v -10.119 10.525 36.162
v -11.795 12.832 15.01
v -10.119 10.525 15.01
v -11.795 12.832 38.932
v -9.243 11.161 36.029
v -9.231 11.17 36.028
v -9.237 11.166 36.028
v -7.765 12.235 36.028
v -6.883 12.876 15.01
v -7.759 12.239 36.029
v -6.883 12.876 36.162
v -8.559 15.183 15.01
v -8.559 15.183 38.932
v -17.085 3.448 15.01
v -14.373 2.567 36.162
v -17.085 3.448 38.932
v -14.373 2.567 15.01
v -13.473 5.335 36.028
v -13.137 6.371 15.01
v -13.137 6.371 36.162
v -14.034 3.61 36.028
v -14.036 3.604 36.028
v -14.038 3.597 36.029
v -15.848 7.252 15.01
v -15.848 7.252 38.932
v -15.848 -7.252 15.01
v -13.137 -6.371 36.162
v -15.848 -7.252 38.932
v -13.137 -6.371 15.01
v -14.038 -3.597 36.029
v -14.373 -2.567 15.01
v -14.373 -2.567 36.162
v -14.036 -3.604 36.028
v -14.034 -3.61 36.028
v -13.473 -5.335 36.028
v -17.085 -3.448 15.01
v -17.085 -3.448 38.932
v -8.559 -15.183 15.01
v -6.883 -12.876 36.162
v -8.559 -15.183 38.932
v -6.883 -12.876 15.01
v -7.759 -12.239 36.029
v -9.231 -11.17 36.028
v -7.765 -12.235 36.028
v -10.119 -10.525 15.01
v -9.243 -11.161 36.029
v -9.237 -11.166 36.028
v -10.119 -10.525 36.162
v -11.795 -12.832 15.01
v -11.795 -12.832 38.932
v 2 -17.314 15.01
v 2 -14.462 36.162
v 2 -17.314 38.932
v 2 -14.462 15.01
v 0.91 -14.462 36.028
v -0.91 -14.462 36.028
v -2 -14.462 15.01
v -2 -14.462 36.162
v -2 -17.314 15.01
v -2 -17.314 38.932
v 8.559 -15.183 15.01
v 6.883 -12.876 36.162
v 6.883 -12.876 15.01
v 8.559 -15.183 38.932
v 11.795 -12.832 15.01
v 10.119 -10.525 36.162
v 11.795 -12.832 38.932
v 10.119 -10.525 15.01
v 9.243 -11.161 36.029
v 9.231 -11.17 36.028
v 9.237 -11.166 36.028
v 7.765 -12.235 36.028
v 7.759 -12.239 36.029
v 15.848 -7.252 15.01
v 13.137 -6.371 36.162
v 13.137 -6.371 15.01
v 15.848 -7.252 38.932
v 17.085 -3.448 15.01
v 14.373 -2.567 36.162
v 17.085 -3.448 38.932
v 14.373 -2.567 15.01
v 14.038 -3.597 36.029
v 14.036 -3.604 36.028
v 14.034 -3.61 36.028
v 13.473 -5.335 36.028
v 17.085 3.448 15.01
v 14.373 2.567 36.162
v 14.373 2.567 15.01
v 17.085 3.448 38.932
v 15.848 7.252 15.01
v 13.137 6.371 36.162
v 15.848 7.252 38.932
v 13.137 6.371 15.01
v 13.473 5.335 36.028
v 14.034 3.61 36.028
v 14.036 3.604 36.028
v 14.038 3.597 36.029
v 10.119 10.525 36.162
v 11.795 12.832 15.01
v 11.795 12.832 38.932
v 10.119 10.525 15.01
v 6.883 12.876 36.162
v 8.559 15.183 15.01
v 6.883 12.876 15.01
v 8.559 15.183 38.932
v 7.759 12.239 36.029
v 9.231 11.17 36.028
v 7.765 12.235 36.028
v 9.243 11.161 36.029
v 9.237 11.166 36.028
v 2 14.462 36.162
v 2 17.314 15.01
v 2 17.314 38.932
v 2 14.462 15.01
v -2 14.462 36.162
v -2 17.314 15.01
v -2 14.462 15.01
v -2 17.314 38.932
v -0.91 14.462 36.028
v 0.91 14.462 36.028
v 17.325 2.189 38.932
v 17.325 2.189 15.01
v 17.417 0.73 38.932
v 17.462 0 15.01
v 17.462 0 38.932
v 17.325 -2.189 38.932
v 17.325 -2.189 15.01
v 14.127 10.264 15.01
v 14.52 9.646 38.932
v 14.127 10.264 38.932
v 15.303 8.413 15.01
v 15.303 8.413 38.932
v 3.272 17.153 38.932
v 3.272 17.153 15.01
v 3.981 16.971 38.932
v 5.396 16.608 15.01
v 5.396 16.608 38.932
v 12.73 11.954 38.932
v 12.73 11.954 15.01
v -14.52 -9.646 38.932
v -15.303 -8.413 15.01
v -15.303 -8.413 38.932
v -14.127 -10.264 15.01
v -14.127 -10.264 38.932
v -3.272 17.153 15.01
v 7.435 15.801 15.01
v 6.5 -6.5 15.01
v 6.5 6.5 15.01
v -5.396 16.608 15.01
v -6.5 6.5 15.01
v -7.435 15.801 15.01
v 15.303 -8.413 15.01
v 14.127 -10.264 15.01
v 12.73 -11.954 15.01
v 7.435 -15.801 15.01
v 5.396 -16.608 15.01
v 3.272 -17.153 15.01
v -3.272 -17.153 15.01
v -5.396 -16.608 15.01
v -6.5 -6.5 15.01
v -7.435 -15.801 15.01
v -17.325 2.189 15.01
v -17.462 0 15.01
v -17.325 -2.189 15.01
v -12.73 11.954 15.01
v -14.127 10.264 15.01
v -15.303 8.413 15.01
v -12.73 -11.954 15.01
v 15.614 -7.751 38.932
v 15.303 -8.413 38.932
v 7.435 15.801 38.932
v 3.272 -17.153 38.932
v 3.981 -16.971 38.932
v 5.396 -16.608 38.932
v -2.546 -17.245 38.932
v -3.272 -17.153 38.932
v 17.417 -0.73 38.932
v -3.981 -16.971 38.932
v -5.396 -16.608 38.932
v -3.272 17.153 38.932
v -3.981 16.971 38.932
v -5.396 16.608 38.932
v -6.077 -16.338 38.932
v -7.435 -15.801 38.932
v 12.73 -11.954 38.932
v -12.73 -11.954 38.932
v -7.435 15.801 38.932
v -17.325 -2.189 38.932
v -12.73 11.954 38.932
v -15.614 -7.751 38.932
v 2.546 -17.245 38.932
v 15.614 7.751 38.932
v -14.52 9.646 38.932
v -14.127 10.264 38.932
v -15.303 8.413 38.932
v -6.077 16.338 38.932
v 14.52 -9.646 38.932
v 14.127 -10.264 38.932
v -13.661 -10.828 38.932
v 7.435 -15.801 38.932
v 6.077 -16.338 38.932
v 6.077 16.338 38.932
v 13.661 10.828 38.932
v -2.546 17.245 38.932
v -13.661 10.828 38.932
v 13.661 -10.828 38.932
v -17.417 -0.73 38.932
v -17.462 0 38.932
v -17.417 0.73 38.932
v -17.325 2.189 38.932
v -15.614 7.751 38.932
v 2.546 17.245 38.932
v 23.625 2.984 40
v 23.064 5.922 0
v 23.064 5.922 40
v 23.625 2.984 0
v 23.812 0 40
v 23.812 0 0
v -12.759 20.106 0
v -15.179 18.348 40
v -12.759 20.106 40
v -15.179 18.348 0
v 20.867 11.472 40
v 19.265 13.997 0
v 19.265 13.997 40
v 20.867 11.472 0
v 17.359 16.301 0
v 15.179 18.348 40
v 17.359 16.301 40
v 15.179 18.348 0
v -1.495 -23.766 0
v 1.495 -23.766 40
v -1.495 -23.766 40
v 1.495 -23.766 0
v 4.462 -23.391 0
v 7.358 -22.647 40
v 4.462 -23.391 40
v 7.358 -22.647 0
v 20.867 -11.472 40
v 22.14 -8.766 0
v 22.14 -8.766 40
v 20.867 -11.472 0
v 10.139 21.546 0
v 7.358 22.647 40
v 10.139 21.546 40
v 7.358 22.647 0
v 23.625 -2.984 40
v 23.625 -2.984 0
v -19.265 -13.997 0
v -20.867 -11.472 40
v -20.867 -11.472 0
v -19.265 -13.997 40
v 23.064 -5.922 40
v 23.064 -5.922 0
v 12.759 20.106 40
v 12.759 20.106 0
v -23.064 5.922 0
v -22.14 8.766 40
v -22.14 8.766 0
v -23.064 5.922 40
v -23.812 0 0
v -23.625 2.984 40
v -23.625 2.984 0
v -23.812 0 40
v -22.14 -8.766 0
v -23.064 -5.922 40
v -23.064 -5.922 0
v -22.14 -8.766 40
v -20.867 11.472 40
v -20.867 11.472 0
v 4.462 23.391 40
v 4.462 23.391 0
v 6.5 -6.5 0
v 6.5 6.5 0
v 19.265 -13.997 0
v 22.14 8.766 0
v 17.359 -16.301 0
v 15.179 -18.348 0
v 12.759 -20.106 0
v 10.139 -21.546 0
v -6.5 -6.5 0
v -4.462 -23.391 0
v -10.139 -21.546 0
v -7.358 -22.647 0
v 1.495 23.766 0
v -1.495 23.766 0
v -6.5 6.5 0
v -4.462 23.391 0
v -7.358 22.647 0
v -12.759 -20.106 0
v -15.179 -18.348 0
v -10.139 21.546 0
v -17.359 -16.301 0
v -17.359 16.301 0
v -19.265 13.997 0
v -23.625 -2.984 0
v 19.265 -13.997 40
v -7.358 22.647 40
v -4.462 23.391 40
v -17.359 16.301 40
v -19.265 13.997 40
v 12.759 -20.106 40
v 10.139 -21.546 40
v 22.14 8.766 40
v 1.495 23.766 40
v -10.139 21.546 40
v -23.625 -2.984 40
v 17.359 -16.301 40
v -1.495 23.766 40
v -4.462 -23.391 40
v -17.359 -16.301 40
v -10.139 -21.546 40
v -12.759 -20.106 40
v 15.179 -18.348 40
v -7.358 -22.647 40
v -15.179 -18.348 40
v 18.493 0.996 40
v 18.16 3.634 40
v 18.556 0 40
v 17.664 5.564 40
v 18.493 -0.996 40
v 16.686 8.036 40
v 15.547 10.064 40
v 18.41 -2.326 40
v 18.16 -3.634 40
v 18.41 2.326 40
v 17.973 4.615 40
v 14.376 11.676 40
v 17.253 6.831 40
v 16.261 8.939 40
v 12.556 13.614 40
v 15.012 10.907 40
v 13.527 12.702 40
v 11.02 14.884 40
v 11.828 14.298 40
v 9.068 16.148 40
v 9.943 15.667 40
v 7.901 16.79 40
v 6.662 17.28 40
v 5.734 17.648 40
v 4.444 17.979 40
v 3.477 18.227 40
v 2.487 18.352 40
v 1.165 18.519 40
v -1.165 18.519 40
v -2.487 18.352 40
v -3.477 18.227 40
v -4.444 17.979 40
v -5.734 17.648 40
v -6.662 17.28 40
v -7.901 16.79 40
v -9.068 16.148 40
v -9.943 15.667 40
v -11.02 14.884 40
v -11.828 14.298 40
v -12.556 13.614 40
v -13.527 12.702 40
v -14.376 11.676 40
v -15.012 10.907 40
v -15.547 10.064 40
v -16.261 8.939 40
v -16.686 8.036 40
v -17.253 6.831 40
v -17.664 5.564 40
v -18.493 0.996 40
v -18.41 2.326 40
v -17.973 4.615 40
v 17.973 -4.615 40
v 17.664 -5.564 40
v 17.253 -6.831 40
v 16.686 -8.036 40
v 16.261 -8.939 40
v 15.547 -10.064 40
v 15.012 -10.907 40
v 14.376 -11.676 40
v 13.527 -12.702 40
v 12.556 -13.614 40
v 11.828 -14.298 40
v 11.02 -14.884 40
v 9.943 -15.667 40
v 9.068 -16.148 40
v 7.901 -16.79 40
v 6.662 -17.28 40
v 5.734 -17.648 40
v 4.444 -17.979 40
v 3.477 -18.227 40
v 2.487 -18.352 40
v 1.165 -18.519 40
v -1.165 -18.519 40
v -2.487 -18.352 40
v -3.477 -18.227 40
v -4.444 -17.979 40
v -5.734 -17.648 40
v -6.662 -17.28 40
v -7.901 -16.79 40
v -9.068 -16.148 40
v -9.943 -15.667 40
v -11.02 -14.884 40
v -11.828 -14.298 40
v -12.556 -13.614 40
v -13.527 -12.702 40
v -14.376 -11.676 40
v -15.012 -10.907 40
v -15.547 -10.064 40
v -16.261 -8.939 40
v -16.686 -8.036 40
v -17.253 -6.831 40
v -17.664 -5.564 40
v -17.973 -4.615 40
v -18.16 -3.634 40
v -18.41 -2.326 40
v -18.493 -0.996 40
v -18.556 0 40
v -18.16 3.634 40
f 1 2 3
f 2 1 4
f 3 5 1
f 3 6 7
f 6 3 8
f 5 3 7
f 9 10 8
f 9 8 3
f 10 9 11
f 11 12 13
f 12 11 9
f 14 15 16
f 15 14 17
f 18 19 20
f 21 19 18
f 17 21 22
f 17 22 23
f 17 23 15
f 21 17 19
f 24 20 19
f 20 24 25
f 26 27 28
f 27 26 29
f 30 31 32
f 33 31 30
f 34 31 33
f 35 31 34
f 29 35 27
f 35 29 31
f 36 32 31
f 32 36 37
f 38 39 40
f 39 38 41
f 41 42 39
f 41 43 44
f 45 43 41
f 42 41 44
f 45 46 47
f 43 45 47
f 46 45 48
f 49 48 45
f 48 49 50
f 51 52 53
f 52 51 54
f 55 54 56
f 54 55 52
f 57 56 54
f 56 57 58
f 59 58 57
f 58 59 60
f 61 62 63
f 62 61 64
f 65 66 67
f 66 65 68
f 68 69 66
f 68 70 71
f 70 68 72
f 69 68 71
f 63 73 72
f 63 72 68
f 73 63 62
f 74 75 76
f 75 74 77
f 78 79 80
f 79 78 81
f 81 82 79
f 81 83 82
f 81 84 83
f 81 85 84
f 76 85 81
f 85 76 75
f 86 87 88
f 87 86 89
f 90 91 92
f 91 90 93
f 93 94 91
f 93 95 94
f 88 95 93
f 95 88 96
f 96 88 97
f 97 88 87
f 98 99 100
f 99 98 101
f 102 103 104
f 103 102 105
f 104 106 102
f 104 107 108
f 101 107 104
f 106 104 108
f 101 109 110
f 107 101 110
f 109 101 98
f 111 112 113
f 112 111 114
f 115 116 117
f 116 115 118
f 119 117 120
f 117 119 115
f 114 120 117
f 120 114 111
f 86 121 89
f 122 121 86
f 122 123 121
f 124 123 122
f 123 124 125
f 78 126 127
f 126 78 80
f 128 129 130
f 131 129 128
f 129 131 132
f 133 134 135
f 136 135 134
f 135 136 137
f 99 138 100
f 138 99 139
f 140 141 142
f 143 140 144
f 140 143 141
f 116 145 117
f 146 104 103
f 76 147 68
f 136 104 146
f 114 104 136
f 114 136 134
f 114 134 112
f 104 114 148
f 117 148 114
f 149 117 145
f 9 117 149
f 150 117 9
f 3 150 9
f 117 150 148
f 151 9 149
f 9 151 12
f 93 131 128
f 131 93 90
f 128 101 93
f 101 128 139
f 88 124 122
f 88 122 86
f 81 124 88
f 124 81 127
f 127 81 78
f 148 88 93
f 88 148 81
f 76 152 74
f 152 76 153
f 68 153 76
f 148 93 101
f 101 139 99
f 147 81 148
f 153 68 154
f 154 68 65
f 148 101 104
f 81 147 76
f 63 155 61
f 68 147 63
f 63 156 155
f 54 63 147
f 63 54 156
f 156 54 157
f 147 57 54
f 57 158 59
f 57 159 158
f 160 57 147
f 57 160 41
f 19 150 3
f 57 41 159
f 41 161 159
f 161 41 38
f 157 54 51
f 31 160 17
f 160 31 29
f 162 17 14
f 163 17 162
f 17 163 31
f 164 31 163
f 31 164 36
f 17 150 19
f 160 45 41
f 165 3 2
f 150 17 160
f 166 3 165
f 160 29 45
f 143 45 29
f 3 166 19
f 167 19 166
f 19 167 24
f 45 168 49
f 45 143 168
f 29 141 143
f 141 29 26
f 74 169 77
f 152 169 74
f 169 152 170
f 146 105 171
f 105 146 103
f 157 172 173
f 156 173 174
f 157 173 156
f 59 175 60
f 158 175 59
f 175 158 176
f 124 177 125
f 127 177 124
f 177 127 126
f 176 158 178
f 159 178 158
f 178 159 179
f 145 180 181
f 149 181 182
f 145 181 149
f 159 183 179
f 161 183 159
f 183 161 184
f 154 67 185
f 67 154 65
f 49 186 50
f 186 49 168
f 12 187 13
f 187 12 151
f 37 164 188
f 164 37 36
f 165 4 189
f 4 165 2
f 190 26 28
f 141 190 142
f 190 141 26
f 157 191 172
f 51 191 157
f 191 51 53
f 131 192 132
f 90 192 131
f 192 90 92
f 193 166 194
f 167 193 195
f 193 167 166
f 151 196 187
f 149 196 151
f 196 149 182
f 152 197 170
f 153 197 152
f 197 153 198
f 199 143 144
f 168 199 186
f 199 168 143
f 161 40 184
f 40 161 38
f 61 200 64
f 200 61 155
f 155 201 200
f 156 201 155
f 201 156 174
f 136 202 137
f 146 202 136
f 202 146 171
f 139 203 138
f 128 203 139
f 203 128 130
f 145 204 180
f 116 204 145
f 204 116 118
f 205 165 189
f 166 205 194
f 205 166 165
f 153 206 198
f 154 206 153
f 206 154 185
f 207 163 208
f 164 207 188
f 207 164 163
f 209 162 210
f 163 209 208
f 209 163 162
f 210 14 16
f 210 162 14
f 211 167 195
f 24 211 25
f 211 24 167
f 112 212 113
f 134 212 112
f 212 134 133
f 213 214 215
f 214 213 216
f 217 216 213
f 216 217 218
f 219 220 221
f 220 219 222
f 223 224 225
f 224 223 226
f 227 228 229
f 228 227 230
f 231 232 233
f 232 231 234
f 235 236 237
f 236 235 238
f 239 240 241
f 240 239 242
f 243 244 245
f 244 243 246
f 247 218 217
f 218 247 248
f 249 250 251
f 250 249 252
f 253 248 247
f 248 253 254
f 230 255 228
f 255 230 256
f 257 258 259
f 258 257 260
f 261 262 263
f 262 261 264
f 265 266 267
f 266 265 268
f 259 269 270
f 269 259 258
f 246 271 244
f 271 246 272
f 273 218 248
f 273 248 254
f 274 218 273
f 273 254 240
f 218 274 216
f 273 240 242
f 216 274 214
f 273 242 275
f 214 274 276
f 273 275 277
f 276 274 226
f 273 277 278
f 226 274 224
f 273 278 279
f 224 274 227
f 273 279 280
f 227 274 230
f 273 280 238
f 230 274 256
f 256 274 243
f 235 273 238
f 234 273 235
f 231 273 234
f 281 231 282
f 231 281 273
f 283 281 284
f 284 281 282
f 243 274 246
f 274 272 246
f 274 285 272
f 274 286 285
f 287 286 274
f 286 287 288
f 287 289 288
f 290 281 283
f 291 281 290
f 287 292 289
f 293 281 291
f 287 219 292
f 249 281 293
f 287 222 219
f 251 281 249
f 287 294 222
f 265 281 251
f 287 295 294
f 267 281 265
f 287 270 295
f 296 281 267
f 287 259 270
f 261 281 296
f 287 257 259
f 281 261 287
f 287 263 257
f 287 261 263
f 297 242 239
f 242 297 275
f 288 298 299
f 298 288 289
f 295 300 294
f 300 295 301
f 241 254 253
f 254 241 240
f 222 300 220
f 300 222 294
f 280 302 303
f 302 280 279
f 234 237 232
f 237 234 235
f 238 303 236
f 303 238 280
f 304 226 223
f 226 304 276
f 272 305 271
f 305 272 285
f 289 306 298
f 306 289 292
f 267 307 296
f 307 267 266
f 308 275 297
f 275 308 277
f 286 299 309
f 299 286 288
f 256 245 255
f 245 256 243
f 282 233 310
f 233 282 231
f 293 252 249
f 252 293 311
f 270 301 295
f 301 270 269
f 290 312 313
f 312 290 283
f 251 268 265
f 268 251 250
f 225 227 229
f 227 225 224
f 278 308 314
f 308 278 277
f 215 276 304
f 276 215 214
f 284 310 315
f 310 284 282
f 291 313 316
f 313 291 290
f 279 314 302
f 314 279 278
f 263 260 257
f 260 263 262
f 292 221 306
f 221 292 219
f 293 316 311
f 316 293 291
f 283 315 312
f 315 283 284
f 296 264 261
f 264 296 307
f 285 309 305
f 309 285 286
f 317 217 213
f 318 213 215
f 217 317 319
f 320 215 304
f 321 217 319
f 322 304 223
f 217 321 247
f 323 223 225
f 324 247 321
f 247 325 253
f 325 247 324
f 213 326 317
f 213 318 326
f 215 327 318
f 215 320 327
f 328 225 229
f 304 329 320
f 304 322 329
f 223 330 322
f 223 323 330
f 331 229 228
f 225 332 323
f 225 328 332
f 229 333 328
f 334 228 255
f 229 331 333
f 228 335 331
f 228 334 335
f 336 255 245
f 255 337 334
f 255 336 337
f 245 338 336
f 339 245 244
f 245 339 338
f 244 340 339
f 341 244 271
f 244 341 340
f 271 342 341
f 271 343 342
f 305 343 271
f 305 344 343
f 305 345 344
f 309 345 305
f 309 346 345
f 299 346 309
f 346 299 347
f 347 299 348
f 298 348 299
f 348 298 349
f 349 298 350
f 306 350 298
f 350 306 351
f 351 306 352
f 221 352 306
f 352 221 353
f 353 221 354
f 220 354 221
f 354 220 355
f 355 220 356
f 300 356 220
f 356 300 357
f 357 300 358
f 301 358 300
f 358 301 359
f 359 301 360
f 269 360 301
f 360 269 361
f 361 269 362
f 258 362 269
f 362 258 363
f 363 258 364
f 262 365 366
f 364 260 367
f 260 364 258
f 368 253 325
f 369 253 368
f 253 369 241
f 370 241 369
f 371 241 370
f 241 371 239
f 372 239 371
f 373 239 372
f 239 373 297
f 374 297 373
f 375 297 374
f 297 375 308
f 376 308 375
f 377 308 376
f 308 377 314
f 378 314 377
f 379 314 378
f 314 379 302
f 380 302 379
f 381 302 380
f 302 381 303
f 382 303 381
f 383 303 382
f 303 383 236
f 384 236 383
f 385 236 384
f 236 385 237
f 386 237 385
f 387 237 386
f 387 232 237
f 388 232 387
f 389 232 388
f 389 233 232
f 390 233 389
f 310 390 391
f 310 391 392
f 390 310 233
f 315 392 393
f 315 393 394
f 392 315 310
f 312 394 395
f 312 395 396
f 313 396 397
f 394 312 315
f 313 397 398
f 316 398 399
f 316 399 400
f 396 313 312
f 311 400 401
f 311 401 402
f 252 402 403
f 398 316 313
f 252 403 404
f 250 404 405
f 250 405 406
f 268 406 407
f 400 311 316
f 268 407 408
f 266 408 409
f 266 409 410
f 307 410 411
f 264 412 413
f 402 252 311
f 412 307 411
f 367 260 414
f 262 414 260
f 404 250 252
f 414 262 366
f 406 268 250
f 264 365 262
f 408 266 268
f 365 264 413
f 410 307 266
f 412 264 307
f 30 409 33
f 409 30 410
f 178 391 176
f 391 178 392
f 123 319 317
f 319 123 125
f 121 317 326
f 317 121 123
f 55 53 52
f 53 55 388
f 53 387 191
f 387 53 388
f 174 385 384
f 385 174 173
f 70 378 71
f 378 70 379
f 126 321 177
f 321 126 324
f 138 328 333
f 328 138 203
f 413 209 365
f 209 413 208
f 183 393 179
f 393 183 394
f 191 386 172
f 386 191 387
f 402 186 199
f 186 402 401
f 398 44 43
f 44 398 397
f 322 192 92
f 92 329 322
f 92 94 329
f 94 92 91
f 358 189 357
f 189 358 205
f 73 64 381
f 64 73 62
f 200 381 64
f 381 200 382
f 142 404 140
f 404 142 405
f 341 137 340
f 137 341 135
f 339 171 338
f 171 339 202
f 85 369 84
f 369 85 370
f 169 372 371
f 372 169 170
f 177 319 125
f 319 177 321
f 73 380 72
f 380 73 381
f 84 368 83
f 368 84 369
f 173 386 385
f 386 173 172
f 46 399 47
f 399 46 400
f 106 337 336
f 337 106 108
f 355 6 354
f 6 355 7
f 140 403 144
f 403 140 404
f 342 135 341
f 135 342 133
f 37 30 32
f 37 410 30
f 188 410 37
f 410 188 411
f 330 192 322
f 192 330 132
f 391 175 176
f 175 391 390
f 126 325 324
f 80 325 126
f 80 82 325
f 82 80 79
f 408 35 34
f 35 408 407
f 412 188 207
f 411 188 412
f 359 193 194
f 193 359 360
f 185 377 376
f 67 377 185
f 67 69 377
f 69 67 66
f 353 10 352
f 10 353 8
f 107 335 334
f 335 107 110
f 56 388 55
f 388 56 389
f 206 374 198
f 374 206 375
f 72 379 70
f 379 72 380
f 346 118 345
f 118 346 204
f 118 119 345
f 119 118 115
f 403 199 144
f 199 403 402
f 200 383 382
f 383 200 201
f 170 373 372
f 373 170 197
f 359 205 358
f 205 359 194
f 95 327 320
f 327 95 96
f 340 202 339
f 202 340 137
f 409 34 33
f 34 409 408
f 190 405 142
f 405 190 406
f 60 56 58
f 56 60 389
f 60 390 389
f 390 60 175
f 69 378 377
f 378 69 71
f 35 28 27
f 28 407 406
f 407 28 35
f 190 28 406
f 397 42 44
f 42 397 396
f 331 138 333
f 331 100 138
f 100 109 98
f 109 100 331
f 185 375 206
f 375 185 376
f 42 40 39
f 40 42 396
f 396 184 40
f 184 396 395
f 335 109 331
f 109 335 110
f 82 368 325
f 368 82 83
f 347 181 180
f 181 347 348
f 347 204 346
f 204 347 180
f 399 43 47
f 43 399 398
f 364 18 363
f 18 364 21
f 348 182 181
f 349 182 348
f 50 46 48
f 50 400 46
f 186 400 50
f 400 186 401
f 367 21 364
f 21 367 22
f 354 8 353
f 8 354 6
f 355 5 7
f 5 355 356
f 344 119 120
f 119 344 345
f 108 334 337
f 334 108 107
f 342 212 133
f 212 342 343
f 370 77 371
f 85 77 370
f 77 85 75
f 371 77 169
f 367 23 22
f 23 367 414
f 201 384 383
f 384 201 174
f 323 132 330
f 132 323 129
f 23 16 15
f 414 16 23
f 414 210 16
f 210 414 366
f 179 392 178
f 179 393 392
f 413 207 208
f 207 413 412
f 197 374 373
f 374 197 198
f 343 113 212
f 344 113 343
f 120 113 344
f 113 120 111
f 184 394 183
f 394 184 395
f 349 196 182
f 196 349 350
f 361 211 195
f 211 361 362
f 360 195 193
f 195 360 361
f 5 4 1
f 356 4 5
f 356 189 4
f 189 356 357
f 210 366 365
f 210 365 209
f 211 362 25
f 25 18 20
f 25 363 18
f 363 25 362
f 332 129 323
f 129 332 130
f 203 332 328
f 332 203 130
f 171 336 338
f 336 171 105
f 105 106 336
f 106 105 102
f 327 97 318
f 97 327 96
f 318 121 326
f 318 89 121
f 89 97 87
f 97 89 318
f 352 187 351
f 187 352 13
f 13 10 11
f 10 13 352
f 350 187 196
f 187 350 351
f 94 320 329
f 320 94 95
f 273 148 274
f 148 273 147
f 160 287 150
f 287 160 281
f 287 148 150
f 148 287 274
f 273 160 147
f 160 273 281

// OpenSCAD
/* File: spline_coupler.scad
 * Coupler for splined shaft
 * Author: deh
 * Latest edit: 20180225
 */


 $fn=50;
 
 big = 50;  // Big number

iod = (1+3/8)*25.4; // Shaft od (inside dia of coupler)
sp_wid = 4; // Spline tooth width
sp_dep = 3; // Spline tooth depth
number_teeth = 10;
sp_ht = 25; // Height of splined partion

cp_od = iod + 0.25*25.4*2; // Coupler outer dia
cp_ht = sp_ht + 15; // Height (length) of coupler

module spline_shaft()
{
    ofs_r = iod/2 - sp_dep;
    difference()
    {
        cylinder (d=iod, h = sp_ht, center=false);
        
        union()
        {
            step = 360/number_teeth;
            for (i = [step : step : (360 + .01)])
            {
                rotate([0,0,i])
                translate([-sp_wid/2,ofs_r,-0.05])
                    cube([sp_wid,big,big],center=false);    
            }
        }
    }
}

// difference a cylinder with the spline shaft
module coupler()
{
    difference()
    {
            union()
            {
                cylinder(d=cp_od, h=cp_ht, center=false);
            }
            union()
            {

                ofs_x = cp_ht-sp_ht+.01;
                translate([0,0,ofs_x])
                    spline_shaft();
            }  
    }
}

// Add a chamfer to the coupler
module coupler_chamfered()
{
    difference()
    {
        coupler();
        
        translate([0,0,cp_ht-4])
            cylinder(d1=iod-sp_dep*2,d2=cp_od+12 ,h=15,center=false);
    }
}

drv_wid = 13;	// Width of square socket drive

module total()
{
	difference()
	{
		coupler_chamfered();

		cube([drv_wid,drv_wid,big],center=true);
	}
} 
total();
